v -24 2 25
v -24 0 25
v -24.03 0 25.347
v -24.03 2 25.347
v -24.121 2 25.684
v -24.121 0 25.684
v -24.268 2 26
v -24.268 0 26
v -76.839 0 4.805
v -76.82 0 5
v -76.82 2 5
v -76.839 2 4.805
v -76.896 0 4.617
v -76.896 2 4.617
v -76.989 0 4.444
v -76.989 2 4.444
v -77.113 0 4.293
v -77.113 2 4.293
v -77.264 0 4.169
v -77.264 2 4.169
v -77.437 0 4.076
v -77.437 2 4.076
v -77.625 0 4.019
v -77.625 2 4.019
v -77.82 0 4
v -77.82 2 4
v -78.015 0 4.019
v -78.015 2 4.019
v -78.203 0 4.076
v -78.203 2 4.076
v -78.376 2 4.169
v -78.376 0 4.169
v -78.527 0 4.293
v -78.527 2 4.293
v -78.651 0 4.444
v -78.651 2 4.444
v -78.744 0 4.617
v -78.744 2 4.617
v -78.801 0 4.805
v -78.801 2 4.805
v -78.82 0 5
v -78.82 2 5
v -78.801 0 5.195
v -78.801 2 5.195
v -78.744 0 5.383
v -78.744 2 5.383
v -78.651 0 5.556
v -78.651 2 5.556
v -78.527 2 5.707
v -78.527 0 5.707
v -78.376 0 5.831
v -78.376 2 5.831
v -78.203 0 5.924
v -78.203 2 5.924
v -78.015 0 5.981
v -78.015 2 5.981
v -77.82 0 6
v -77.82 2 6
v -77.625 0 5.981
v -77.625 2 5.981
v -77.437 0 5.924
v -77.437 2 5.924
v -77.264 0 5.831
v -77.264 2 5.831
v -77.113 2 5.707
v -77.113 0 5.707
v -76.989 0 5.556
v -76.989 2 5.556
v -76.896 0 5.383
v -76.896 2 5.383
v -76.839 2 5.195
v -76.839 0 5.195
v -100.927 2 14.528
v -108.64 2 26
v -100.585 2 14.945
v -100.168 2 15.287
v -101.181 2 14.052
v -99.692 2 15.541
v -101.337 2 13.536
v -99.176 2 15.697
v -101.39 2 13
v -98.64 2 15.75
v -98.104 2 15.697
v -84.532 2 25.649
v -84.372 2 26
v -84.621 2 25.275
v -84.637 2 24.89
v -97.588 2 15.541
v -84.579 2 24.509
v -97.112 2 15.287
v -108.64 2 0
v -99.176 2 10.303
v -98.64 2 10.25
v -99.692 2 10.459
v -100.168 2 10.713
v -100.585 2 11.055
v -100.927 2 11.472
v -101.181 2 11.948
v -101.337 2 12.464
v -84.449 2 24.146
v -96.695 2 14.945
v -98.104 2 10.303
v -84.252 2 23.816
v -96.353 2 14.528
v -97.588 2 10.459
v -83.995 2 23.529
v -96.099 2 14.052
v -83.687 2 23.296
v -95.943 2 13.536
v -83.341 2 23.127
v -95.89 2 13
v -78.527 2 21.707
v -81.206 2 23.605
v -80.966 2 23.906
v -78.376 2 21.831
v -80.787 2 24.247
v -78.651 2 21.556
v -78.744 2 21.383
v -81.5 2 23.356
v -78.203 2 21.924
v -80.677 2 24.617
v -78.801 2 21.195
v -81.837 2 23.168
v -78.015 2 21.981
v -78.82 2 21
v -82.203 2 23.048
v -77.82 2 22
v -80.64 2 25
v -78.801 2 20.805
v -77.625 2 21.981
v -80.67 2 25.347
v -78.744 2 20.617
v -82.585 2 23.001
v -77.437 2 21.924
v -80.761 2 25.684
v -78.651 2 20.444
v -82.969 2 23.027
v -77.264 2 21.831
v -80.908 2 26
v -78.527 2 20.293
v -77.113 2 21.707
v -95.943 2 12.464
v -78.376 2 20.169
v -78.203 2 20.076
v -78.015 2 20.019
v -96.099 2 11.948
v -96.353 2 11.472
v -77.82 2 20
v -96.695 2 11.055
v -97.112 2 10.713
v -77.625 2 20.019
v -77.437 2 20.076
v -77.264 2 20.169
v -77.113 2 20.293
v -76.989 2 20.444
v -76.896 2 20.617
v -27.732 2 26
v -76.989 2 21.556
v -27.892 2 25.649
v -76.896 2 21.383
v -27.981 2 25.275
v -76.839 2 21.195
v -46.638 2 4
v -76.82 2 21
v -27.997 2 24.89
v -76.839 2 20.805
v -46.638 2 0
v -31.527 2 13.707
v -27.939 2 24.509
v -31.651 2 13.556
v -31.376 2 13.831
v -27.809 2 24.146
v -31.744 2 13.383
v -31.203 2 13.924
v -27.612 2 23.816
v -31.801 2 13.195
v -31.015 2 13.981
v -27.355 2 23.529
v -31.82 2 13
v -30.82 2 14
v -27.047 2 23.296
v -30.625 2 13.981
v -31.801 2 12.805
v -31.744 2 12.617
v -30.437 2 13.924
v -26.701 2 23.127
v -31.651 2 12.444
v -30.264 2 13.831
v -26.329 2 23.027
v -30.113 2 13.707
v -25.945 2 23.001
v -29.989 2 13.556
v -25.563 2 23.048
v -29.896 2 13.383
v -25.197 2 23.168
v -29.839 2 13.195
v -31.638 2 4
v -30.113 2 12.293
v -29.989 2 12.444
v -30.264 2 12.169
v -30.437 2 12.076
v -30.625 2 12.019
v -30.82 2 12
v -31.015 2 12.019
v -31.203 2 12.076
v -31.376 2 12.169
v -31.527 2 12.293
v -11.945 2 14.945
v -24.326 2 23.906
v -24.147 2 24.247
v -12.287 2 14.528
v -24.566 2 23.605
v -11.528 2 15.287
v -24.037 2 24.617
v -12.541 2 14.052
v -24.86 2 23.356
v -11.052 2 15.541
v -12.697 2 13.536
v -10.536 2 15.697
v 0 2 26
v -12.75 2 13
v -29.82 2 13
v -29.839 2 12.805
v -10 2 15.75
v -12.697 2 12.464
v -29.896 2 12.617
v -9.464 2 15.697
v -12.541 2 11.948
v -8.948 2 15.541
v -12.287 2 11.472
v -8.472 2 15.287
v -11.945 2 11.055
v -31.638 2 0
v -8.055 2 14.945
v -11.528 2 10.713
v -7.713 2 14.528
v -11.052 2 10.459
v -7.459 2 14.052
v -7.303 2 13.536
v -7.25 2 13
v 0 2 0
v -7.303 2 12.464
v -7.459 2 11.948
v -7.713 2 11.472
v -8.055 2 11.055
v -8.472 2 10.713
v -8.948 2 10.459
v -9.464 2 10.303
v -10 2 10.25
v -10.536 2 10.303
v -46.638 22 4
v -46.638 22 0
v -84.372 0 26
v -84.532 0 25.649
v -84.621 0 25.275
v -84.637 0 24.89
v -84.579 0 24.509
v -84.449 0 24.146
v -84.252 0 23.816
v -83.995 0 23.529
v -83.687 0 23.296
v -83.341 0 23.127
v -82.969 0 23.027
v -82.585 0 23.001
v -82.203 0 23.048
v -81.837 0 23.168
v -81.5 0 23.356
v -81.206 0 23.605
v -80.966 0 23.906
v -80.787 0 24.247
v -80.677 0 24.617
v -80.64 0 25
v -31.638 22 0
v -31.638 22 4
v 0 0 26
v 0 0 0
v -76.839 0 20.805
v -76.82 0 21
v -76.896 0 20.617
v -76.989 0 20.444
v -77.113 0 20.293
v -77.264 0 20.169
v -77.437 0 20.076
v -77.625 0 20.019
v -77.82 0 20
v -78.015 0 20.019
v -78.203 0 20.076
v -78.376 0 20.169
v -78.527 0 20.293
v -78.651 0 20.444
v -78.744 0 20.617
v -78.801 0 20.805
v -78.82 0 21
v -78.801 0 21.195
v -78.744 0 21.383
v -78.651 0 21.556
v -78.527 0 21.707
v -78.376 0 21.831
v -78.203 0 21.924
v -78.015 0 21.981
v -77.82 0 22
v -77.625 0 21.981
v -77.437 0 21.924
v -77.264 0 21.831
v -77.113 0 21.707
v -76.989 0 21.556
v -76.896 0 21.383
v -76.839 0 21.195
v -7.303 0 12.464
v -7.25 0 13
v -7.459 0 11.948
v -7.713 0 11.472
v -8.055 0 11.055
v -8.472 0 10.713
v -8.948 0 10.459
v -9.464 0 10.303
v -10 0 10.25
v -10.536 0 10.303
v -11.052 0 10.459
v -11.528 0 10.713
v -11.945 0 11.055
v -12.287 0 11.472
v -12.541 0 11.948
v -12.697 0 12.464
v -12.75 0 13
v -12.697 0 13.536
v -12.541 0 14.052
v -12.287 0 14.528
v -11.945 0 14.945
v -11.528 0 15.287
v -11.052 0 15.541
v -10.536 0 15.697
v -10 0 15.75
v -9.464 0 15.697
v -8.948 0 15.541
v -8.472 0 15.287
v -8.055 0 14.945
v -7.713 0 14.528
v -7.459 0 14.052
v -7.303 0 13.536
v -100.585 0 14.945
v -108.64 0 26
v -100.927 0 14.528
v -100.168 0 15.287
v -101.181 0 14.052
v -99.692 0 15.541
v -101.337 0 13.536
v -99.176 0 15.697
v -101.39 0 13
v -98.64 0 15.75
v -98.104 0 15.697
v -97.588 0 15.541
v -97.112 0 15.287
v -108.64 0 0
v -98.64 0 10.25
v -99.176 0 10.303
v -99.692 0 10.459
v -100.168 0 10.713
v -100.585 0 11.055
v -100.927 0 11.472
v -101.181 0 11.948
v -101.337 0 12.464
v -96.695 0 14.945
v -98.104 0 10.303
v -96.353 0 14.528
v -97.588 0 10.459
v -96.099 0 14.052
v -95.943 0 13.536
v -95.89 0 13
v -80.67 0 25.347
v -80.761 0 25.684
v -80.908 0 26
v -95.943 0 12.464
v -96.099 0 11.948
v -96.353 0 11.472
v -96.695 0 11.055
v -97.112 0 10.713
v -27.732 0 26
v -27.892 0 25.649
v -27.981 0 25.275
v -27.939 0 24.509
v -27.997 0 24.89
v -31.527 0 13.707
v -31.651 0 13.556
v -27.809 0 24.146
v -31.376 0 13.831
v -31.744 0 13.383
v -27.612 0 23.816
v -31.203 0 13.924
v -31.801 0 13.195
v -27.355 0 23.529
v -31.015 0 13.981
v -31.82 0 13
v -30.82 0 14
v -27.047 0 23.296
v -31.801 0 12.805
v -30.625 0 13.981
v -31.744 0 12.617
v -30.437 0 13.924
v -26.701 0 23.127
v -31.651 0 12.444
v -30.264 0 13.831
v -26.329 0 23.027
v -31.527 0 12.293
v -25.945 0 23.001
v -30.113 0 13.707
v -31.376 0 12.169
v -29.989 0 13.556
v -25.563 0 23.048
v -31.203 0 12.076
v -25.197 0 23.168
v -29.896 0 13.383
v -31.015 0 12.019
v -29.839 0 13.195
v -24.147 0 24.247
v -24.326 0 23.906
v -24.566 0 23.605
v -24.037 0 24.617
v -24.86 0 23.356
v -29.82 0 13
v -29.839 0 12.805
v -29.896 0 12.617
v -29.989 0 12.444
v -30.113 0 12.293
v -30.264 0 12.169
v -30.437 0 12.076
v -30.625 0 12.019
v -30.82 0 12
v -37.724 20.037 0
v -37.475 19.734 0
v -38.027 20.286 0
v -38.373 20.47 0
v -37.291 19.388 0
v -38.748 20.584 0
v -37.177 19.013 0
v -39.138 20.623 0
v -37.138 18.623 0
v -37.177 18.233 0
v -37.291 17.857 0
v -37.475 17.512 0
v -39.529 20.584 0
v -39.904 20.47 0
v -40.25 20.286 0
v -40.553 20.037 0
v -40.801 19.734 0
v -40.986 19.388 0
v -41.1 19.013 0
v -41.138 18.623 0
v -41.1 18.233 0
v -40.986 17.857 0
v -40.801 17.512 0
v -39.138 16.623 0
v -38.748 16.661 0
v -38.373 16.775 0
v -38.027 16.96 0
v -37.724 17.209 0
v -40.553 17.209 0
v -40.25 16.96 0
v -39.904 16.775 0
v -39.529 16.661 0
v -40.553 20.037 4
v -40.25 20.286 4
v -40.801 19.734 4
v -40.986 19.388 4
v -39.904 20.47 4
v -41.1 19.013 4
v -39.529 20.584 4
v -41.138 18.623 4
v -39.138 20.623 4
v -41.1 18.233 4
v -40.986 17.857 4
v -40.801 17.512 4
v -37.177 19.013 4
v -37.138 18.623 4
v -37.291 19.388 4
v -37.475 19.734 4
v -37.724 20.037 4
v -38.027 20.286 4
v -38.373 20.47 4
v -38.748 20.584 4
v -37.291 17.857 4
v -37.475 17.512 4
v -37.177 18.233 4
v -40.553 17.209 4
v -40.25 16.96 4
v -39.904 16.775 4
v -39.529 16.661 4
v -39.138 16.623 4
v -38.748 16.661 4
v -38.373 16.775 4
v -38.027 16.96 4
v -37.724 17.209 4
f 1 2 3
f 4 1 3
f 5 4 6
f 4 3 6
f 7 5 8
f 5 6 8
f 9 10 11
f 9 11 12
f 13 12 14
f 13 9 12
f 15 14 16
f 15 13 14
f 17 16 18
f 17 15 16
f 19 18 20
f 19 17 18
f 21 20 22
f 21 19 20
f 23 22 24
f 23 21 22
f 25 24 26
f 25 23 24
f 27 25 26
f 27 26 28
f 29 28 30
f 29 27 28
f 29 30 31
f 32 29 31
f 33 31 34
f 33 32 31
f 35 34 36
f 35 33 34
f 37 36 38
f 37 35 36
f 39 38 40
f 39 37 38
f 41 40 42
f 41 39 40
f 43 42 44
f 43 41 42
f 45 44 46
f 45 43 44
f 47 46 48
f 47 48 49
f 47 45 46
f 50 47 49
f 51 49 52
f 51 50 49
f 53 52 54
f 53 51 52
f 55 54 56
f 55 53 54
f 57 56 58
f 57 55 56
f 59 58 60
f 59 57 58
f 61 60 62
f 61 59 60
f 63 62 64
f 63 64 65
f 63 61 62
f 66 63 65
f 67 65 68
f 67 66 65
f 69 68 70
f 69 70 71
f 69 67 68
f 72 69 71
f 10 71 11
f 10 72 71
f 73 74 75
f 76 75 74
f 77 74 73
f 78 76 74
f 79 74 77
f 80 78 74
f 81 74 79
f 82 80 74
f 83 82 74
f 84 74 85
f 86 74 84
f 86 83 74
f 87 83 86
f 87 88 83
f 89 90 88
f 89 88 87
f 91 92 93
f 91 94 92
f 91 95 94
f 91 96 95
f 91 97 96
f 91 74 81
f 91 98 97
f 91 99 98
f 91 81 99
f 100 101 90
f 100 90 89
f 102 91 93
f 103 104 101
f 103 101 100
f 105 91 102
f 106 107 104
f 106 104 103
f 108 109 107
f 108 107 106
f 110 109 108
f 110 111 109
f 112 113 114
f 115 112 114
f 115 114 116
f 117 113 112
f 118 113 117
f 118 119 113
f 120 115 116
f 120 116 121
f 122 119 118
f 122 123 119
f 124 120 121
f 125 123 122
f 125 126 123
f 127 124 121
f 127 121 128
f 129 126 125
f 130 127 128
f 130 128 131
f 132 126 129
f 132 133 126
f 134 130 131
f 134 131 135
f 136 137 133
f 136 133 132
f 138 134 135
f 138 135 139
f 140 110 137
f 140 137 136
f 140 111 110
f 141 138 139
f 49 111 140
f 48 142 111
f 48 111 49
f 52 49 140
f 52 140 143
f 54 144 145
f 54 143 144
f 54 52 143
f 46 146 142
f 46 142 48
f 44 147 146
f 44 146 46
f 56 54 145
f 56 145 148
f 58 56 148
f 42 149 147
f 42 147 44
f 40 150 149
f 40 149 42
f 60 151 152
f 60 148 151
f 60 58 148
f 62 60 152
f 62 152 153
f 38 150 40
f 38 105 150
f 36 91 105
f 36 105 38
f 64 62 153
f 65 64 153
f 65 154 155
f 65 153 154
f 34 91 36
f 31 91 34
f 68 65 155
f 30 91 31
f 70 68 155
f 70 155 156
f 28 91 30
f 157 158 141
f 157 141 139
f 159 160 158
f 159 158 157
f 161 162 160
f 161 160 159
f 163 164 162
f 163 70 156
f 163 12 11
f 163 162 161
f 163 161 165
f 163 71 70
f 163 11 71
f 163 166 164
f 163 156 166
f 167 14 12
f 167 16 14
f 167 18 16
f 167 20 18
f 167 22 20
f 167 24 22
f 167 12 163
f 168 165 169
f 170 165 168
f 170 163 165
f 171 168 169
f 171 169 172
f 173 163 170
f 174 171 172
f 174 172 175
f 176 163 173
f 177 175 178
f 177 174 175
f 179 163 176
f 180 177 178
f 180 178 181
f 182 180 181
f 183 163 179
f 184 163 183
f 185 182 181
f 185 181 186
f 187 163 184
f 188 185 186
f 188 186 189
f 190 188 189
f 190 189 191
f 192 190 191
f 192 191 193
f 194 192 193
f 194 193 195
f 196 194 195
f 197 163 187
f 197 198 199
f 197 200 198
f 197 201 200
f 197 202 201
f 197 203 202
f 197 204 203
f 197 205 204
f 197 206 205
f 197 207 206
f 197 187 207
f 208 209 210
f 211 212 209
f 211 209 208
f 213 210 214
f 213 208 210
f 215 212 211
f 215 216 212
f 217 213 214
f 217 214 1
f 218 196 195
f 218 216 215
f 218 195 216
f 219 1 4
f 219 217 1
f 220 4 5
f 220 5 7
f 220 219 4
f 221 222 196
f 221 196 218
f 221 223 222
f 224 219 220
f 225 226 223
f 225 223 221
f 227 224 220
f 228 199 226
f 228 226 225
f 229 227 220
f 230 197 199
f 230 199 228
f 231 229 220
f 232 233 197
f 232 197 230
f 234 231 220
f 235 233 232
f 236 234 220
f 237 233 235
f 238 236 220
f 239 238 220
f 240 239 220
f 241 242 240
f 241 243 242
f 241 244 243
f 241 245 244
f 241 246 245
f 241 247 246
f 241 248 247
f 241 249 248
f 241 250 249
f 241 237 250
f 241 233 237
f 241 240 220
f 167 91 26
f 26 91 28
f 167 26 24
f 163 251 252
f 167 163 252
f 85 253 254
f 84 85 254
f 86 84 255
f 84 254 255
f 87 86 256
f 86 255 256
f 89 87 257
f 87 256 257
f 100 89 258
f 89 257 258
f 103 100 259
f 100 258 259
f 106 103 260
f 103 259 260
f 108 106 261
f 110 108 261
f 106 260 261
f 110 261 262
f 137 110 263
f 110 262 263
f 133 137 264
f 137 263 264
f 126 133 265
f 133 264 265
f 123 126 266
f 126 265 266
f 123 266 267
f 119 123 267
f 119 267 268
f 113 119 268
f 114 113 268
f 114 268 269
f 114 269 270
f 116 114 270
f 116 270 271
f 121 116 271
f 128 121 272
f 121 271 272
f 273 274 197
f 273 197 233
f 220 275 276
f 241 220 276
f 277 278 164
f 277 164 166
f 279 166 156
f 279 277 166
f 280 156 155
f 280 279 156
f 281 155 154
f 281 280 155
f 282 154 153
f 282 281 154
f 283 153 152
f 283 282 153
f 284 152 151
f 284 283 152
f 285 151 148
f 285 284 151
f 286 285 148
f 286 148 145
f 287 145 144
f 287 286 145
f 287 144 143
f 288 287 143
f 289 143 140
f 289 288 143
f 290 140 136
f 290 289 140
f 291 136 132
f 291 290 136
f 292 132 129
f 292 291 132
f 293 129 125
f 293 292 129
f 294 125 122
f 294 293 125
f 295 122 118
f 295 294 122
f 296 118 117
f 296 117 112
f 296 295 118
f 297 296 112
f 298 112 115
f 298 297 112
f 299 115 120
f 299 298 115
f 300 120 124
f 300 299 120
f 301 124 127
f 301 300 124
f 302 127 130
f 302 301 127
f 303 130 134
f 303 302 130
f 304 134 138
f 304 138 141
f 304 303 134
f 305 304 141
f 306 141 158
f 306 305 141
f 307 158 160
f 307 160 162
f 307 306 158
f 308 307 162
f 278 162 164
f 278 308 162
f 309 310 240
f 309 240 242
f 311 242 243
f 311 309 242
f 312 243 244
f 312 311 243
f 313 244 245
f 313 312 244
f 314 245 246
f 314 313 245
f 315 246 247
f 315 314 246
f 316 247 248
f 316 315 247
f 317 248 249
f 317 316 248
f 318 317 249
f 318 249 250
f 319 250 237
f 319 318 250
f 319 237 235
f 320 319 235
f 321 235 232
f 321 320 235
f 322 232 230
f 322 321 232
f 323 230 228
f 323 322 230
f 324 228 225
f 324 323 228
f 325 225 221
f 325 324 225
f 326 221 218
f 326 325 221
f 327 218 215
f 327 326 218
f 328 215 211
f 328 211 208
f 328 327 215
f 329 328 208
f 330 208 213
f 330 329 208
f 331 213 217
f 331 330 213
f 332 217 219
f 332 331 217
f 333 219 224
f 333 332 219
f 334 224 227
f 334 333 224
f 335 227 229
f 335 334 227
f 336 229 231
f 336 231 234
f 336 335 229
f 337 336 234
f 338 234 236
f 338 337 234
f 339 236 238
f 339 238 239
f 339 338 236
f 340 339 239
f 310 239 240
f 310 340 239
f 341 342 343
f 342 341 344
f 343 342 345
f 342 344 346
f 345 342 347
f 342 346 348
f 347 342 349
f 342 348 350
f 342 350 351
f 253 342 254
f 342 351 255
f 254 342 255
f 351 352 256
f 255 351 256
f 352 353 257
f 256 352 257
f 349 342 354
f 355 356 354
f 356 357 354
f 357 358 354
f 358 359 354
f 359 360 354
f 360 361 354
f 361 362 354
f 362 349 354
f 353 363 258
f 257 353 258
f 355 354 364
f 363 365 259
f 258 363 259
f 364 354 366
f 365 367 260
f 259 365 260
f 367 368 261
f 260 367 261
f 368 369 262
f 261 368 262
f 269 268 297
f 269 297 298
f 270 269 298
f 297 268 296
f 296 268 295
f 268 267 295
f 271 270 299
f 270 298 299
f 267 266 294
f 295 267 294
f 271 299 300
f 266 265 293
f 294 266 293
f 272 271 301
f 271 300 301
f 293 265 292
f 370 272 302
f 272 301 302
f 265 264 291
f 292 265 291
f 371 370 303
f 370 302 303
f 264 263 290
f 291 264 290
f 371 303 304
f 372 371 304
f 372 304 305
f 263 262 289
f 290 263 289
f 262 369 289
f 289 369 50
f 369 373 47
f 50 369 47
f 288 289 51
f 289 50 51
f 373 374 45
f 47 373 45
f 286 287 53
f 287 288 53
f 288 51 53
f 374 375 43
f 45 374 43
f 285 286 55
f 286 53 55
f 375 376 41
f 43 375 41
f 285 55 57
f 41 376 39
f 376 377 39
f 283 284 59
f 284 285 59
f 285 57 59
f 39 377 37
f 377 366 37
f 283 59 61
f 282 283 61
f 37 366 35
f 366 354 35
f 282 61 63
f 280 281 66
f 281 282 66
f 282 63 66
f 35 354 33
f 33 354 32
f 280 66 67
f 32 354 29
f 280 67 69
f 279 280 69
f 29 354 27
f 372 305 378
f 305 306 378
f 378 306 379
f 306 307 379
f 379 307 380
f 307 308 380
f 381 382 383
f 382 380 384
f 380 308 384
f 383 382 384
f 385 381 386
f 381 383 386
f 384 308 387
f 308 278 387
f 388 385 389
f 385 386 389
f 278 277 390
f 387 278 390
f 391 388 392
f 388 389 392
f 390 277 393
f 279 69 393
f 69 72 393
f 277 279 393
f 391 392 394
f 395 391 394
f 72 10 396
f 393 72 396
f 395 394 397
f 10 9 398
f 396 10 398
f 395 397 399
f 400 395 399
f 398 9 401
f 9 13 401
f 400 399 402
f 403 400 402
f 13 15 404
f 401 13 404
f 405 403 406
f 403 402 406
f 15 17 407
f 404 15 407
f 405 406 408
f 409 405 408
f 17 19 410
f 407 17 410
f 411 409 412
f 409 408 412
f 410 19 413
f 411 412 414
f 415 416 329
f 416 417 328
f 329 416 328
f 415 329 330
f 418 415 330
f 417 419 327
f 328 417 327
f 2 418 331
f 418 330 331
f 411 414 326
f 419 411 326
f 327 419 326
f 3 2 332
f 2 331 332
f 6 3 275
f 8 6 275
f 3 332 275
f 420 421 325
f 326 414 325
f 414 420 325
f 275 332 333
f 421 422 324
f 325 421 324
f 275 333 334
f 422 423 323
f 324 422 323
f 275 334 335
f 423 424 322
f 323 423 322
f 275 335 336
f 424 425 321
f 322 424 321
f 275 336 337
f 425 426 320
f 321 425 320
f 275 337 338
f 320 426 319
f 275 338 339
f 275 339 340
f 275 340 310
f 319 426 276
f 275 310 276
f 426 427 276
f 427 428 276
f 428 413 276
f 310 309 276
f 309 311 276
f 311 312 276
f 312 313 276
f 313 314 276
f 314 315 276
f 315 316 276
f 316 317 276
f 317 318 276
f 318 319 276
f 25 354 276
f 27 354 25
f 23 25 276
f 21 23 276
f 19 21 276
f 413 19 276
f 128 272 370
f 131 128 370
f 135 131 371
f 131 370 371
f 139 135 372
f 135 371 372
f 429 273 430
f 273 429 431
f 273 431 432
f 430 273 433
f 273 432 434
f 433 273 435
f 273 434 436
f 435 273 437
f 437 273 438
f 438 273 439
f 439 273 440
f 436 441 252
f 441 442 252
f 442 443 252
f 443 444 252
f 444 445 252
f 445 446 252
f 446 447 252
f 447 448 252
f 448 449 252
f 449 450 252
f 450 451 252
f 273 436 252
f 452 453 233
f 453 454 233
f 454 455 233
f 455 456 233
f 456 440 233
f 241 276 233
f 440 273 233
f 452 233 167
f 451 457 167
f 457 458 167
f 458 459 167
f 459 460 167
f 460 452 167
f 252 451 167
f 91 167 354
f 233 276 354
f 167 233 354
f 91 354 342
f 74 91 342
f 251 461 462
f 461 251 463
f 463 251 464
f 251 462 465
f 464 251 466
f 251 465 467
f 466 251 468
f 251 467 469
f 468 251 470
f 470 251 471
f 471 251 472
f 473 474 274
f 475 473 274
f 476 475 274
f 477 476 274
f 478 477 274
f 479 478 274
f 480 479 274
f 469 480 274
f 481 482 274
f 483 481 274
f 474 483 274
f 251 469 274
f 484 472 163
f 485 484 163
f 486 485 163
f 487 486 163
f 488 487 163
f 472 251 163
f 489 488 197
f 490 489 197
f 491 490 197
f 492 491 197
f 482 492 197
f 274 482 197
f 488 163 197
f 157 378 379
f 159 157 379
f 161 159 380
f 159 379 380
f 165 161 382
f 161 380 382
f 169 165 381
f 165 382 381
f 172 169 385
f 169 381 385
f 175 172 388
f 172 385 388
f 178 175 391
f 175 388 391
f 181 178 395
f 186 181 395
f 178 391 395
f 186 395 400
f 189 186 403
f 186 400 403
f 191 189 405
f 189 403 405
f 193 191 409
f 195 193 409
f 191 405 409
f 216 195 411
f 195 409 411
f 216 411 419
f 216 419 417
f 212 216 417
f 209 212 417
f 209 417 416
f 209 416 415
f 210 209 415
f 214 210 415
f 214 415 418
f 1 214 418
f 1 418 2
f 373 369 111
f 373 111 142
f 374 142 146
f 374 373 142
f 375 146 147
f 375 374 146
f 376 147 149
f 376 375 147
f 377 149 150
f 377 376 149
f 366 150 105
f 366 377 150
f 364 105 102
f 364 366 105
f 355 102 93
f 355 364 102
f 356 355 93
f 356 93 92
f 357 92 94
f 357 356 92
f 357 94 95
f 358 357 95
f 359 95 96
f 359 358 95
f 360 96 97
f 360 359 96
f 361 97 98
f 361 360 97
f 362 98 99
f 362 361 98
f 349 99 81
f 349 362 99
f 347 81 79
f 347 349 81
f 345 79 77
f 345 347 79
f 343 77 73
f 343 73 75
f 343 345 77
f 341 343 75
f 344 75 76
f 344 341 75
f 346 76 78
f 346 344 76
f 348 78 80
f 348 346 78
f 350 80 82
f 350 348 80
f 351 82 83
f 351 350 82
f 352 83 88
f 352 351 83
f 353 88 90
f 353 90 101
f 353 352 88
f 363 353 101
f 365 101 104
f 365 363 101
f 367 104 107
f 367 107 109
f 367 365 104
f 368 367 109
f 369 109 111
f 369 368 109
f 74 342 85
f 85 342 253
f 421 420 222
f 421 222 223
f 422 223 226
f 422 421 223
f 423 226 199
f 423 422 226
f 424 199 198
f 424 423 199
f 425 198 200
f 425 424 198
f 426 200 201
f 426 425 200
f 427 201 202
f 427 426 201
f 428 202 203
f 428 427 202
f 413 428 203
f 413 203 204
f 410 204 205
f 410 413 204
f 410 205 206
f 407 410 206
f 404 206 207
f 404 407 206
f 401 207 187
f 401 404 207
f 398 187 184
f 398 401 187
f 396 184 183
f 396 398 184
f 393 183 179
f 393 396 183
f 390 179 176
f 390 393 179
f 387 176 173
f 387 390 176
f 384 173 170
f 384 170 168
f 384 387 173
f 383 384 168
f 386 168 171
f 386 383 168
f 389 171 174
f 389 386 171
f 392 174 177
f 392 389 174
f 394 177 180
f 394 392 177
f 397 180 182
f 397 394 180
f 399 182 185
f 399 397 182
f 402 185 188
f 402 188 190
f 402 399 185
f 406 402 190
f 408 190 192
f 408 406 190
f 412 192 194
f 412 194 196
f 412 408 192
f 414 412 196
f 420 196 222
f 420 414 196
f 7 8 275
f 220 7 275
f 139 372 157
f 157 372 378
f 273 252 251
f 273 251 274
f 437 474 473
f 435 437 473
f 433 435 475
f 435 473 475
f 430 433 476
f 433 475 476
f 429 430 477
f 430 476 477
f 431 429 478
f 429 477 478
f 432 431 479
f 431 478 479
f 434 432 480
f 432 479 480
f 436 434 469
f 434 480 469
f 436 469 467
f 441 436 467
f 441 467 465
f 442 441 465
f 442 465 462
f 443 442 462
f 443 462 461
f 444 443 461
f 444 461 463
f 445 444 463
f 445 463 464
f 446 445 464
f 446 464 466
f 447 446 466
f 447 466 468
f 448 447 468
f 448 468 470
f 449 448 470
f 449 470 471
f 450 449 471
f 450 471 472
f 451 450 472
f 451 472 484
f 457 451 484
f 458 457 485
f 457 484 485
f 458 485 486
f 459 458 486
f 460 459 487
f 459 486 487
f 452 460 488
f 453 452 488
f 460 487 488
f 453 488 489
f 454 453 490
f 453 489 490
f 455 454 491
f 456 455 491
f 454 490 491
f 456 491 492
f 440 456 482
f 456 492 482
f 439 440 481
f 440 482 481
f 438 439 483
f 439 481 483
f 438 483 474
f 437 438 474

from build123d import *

# Parameters (mm, degrees)
SKETCH1_R           = 1
SKETCH1_R_2         = 2.75
BOSS_EXTRUDE1_DEPTH = 2
SKETCH2_W           = 15
SKETCH2_H           = 4
BOSS_EXTRUDE2_DEPTH = 20
SKETCH3_R           = 2
CUT_EXTRUDE1_DEPTH  = 20


with BuildPart() as part:
    # Sketch1 → Boss-Extrude1 (new body)
    with BuildSketch(Plane(origin=(0, 0, 0), x_dir=(1, 0, 0), z_dir=(0, 1, 0))):
        with BuildLine():
            Line((0, -26), (0, 0))
            Line((0, 0), (-32.806184042, 0))
            Line((-32.806184042, 0), (-47.806184042, 0))
            Line((-47.806184042, 0), (-108.64, 0))
            Line((-108.64, 0), (-108.64, -26))
            Line((-108.64, -26), (-84.372050808, -26))
            ThreePointArc((-84.372050808, -26), (-83.15763809, -23.068148347), (-80.64, -25))
            ThreePointArc((-80.64, -25), (-80.708148347, -25.51763809), (-80.907949192, -26))
            Line((-80.907949192, -26), (-27.732050808, -26))
            ThreePointArc((-27.732050808, -26), (-26.51763809, -23.068148347), (-24, -25))
            ThreePointArc((-24, -25), (-24.068148347, -25.51763809), (-24.267949192, -26))
            Line((-24.267949192, -26), (0, -26))
        make_face()
        with Locations((-77.82, -21)):
            Circle(SKETCH1_R, mode=Mode.SUBTRACT)
        with Locations((-98.64, -13)):
            Circle(SKETCH1_R_2, mode=Mode.SUBTRACT)
        with Locations((-77.82, -5)):
            Circle(SKETCH1_R, mode=Mode.SUBTRACT)
        with Locations((-30.82, -13)):
            Circle(SKETCH1_R, mode=Mode.SUBTRACT)
        with Locations((-10, -13)):
            Circle(SKETCH1_R_2, mode=Mode.SUBTRACT)
    extrude(amount=BOSS_EXTRUDE1_DEPTH)

    # Sketch2 → Boss-Extrude2 (add)
    with BuildSketch(Plane(origin=(0, 2, 0), x_dir=(1, 0, 0), z_dir=(0, 1, 0))):
        with Locations((-39.138364189, -2)):
            Rectangle(SKETCH2_W, SKETCH2_H)
    extrude(amount=BOSS_EXTRUDE2_DEPTH)

    # Sketch3 → Cut-Extrude1 (cut)
    with BuildSketch(Plane.XY.offset(4)):
        with Locations((-39.138364189, 18.622728592)):
            Circle(SKETCH3_R)
    extrude(amount=-CUT_EXTRUDE1_DEPTH, mode=Mode.SUBTRACT)


solid = part.part
